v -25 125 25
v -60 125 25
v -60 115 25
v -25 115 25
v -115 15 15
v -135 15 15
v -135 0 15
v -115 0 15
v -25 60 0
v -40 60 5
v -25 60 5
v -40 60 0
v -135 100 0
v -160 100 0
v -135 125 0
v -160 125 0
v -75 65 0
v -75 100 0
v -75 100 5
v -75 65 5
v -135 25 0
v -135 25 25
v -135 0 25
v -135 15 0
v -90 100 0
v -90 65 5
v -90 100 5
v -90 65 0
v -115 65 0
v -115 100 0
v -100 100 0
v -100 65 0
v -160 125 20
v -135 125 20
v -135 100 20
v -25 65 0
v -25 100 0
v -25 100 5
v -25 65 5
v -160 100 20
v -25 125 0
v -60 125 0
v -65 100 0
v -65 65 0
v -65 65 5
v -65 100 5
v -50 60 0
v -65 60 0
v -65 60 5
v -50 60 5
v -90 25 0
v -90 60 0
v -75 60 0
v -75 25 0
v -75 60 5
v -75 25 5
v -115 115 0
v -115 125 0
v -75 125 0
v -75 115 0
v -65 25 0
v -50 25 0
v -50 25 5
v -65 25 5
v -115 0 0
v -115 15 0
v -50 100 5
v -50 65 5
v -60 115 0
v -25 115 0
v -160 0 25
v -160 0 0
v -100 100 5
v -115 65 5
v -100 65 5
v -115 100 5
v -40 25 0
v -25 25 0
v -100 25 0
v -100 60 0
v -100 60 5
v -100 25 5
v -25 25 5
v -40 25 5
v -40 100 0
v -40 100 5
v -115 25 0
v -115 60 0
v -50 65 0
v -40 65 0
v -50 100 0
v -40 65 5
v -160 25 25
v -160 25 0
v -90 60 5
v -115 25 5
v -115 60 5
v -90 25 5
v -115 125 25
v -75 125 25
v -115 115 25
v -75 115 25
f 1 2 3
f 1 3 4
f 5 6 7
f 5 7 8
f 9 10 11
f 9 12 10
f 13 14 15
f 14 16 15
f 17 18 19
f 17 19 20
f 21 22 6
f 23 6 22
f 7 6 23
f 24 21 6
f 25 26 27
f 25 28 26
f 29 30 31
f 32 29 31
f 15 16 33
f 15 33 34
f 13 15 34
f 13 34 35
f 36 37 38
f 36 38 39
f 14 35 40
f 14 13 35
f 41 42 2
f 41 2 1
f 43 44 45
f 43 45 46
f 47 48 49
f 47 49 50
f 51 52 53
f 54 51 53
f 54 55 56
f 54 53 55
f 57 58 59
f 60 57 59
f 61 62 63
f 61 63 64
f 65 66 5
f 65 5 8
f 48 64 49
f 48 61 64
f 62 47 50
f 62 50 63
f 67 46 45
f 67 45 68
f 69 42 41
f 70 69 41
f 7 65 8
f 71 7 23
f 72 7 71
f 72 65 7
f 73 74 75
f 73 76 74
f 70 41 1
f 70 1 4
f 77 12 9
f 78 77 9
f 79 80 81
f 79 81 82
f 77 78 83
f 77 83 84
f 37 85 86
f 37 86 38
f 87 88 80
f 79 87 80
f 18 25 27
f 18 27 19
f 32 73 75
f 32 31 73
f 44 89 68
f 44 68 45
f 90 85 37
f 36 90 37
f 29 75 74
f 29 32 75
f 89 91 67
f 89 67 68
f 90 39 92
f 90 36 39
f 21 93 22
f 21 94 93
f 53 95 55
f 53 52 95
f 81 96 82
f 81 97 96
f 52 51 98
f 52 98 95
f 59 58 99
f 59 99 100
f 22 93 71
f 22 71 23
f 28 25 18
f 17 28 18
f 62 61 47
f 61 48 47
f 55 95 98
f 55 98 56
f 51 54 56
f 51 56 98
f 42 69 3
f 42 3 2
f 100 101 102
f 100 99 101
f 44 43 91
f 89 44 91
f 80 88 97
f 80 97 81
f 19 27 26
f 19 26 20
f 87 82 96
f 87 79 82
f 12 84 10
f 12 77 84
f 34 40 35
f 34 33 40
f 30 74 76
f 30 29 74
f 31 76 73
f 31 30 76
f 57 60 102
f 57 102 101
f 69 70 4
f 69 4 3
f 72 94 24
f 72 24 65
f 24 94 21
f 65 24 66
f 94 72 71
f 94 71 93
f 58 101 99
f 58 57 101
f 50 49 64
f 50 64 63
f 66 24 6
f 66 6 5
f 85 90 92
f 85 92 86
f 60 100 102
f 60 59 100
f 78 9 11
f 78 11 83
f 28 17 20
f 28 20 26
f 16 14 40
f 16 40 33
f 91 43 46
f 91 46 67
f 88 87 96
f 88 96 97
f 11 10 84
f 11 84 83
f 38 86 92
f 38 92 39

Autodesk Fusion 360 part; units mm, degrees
sketch "Sketch1" plane through (0, 0, 0) normal (0, 0, 1) x (1, 0, 0)
  line L0 (0, 0) -> (-150, 0)
  line L1 (-150, 0) -> (-150, 125)
  line L2 (-150, 125) -> (0, 125)
  line L3 (0, 125) -> (0, 0)
  line L4 (-160, 25) -> (-135, 25)
  line L5 (-135, 25) -> (-135, 0)
  line L6 (-135, 0) -> (-160, 0)
  line L7 (-160, 0) -> (-160, 25)
  line L8 (-160, 125) -> (-135, 125)
  line L9 (-135, 125) -> (-135, 100)
  line L10 (-135, 100) -> (-160, 100)
  line L11 (-160, 100) -> (-160, 125)
  line L12 (-135, 15) -> (-115, 15)
  line L13 (-115, 15) -> (-115, 0)
  line L14 (-115, 0) -> (-135, 0)
  line L15 (-135, 0) -> (-135, 15)
  line L16 (-115, 125) -> (-75, 125)
  line L17 (-75, 125) -> (-75, 115)
  line L18 (-75, 115) -> (-115, 115)
  line L19 (-115, 115) -> (-115, 125)
  line L20 (-60, 125) -> (-25, 125)
  line L21 (-25, 125) -> (-25, 115)
  line L22 (-25, 115) -> (-60, 115)
  line L23 (-60, 115) -> (-60, 125)
  line L24 (-115, 100) -> (-100, 100)
  line L25 (-100, 100) -> (-100, 65)
  line L26 (-100, 65) -> (-115, 65)
  line L27 (-115, 65) -> (-115, 100)
  line L28 (-115, 60) -> (-100, 60)
  line L29 (-100, 60) -> (-100, 25)
  line L30 (-100, 25) -> (-115, 25)
  line L31 (-115, 25) -> (-115, 60)
  line L32 (-90, 100) -> (-75, 100)
  line L33 (-75, 100) -> (-75, 65)
  line L34 (-75, 65) -> (-90, 65)
  line L35 (-90, 65) -> (-90, 100)
  line L36 (-65, 100) -> (-50, 100)
  line L37 (-50, 100) -> (-50, 65)
  line L38 (-50, 65) -> (-65, 65)
  line L39 (-65, 65) -> (-65, 100)
  line L40 (-40, 100) -> (-25, 100)
  line L41 (-25, 100) -> (-25, 65)
  line L42 (-25, 65) -> (-40, 65)
  line L43 (-40, 65) -> (-40, 100)
  line L44 (-90, 60) -> (-75, 60)
  line L45 (-75, 60) -> (-75, 25)
  line L46 (-75, 25) -> (-90, 25)
  line L47 (-90, 25) -> (-90, 60)
  line L48 (-65, 60) -> (-50, 60)
  line L49 (-50, 60) -> (-50, 25)
  line L50 (-50, 25) -> (-65, 25)
  line L51 (-65, 25) -> (-65, 60)
  line L52 (-40, 60) -> (-25, 60)
  line L53 (-25, 60) -> (-25, 25)
  line L54 (-25, 25) -> (-40, 25)
  line L55 (-40, 25) -> (-40, 60)
extrude "Extrude1" add sketch "Sketch1" along normal blind 5 contours L24 L25 L26 L27 | L28 L29 L30 L31 | L32 L33 L34 L35 | L36 L37 L38 L39 | L40 L41 L42 L43 | L44 L45 L46 L47 | L48 L49 L50 L51 | L52 L53 L54 L55 makes body 1 at (-60, 88.3333, 0) makes body 2 at (-110, 88.3333, 0) makes body 3 at (-85, 88.3333, 0) makes body 4 at (-35, 48.3333, 0) makes body 5 at (-60, 48.3333, 0) makes body 6 at (-110, 48.3333, 0) makes body 7 at (-85, 48.3333, 0) makes body 8 at (-35, 88.3333, 0)
extrude "Extrude2" add sketch "Sketch1" along normal blind 25 separate body contours L2 L20 L21 L22 L23 | L2 L16 L17 L18 L19 makes body 9 at (-88.3333, 115, 8.3333) makes body 10 at (-36.6667, 115, 8.3333)
extrude "Extrude3" add sketch "Sketch1" along normal blind 25 separate body contours L0 L1 L4 L5 L6 L15 | L1 L4 L6 L7 makes body 11
extrude "Extrude4" add sketch "Sketch1" along normal blind 15 contours L0 L5 L12 L13 L14 L15 bodies 11
extrude "Extrude5" add sketch "Sketch1" along normal blind 20 separate body contours L1 L8 L10 L11 | L1 L2 L8 L9 L10 makes body 12
